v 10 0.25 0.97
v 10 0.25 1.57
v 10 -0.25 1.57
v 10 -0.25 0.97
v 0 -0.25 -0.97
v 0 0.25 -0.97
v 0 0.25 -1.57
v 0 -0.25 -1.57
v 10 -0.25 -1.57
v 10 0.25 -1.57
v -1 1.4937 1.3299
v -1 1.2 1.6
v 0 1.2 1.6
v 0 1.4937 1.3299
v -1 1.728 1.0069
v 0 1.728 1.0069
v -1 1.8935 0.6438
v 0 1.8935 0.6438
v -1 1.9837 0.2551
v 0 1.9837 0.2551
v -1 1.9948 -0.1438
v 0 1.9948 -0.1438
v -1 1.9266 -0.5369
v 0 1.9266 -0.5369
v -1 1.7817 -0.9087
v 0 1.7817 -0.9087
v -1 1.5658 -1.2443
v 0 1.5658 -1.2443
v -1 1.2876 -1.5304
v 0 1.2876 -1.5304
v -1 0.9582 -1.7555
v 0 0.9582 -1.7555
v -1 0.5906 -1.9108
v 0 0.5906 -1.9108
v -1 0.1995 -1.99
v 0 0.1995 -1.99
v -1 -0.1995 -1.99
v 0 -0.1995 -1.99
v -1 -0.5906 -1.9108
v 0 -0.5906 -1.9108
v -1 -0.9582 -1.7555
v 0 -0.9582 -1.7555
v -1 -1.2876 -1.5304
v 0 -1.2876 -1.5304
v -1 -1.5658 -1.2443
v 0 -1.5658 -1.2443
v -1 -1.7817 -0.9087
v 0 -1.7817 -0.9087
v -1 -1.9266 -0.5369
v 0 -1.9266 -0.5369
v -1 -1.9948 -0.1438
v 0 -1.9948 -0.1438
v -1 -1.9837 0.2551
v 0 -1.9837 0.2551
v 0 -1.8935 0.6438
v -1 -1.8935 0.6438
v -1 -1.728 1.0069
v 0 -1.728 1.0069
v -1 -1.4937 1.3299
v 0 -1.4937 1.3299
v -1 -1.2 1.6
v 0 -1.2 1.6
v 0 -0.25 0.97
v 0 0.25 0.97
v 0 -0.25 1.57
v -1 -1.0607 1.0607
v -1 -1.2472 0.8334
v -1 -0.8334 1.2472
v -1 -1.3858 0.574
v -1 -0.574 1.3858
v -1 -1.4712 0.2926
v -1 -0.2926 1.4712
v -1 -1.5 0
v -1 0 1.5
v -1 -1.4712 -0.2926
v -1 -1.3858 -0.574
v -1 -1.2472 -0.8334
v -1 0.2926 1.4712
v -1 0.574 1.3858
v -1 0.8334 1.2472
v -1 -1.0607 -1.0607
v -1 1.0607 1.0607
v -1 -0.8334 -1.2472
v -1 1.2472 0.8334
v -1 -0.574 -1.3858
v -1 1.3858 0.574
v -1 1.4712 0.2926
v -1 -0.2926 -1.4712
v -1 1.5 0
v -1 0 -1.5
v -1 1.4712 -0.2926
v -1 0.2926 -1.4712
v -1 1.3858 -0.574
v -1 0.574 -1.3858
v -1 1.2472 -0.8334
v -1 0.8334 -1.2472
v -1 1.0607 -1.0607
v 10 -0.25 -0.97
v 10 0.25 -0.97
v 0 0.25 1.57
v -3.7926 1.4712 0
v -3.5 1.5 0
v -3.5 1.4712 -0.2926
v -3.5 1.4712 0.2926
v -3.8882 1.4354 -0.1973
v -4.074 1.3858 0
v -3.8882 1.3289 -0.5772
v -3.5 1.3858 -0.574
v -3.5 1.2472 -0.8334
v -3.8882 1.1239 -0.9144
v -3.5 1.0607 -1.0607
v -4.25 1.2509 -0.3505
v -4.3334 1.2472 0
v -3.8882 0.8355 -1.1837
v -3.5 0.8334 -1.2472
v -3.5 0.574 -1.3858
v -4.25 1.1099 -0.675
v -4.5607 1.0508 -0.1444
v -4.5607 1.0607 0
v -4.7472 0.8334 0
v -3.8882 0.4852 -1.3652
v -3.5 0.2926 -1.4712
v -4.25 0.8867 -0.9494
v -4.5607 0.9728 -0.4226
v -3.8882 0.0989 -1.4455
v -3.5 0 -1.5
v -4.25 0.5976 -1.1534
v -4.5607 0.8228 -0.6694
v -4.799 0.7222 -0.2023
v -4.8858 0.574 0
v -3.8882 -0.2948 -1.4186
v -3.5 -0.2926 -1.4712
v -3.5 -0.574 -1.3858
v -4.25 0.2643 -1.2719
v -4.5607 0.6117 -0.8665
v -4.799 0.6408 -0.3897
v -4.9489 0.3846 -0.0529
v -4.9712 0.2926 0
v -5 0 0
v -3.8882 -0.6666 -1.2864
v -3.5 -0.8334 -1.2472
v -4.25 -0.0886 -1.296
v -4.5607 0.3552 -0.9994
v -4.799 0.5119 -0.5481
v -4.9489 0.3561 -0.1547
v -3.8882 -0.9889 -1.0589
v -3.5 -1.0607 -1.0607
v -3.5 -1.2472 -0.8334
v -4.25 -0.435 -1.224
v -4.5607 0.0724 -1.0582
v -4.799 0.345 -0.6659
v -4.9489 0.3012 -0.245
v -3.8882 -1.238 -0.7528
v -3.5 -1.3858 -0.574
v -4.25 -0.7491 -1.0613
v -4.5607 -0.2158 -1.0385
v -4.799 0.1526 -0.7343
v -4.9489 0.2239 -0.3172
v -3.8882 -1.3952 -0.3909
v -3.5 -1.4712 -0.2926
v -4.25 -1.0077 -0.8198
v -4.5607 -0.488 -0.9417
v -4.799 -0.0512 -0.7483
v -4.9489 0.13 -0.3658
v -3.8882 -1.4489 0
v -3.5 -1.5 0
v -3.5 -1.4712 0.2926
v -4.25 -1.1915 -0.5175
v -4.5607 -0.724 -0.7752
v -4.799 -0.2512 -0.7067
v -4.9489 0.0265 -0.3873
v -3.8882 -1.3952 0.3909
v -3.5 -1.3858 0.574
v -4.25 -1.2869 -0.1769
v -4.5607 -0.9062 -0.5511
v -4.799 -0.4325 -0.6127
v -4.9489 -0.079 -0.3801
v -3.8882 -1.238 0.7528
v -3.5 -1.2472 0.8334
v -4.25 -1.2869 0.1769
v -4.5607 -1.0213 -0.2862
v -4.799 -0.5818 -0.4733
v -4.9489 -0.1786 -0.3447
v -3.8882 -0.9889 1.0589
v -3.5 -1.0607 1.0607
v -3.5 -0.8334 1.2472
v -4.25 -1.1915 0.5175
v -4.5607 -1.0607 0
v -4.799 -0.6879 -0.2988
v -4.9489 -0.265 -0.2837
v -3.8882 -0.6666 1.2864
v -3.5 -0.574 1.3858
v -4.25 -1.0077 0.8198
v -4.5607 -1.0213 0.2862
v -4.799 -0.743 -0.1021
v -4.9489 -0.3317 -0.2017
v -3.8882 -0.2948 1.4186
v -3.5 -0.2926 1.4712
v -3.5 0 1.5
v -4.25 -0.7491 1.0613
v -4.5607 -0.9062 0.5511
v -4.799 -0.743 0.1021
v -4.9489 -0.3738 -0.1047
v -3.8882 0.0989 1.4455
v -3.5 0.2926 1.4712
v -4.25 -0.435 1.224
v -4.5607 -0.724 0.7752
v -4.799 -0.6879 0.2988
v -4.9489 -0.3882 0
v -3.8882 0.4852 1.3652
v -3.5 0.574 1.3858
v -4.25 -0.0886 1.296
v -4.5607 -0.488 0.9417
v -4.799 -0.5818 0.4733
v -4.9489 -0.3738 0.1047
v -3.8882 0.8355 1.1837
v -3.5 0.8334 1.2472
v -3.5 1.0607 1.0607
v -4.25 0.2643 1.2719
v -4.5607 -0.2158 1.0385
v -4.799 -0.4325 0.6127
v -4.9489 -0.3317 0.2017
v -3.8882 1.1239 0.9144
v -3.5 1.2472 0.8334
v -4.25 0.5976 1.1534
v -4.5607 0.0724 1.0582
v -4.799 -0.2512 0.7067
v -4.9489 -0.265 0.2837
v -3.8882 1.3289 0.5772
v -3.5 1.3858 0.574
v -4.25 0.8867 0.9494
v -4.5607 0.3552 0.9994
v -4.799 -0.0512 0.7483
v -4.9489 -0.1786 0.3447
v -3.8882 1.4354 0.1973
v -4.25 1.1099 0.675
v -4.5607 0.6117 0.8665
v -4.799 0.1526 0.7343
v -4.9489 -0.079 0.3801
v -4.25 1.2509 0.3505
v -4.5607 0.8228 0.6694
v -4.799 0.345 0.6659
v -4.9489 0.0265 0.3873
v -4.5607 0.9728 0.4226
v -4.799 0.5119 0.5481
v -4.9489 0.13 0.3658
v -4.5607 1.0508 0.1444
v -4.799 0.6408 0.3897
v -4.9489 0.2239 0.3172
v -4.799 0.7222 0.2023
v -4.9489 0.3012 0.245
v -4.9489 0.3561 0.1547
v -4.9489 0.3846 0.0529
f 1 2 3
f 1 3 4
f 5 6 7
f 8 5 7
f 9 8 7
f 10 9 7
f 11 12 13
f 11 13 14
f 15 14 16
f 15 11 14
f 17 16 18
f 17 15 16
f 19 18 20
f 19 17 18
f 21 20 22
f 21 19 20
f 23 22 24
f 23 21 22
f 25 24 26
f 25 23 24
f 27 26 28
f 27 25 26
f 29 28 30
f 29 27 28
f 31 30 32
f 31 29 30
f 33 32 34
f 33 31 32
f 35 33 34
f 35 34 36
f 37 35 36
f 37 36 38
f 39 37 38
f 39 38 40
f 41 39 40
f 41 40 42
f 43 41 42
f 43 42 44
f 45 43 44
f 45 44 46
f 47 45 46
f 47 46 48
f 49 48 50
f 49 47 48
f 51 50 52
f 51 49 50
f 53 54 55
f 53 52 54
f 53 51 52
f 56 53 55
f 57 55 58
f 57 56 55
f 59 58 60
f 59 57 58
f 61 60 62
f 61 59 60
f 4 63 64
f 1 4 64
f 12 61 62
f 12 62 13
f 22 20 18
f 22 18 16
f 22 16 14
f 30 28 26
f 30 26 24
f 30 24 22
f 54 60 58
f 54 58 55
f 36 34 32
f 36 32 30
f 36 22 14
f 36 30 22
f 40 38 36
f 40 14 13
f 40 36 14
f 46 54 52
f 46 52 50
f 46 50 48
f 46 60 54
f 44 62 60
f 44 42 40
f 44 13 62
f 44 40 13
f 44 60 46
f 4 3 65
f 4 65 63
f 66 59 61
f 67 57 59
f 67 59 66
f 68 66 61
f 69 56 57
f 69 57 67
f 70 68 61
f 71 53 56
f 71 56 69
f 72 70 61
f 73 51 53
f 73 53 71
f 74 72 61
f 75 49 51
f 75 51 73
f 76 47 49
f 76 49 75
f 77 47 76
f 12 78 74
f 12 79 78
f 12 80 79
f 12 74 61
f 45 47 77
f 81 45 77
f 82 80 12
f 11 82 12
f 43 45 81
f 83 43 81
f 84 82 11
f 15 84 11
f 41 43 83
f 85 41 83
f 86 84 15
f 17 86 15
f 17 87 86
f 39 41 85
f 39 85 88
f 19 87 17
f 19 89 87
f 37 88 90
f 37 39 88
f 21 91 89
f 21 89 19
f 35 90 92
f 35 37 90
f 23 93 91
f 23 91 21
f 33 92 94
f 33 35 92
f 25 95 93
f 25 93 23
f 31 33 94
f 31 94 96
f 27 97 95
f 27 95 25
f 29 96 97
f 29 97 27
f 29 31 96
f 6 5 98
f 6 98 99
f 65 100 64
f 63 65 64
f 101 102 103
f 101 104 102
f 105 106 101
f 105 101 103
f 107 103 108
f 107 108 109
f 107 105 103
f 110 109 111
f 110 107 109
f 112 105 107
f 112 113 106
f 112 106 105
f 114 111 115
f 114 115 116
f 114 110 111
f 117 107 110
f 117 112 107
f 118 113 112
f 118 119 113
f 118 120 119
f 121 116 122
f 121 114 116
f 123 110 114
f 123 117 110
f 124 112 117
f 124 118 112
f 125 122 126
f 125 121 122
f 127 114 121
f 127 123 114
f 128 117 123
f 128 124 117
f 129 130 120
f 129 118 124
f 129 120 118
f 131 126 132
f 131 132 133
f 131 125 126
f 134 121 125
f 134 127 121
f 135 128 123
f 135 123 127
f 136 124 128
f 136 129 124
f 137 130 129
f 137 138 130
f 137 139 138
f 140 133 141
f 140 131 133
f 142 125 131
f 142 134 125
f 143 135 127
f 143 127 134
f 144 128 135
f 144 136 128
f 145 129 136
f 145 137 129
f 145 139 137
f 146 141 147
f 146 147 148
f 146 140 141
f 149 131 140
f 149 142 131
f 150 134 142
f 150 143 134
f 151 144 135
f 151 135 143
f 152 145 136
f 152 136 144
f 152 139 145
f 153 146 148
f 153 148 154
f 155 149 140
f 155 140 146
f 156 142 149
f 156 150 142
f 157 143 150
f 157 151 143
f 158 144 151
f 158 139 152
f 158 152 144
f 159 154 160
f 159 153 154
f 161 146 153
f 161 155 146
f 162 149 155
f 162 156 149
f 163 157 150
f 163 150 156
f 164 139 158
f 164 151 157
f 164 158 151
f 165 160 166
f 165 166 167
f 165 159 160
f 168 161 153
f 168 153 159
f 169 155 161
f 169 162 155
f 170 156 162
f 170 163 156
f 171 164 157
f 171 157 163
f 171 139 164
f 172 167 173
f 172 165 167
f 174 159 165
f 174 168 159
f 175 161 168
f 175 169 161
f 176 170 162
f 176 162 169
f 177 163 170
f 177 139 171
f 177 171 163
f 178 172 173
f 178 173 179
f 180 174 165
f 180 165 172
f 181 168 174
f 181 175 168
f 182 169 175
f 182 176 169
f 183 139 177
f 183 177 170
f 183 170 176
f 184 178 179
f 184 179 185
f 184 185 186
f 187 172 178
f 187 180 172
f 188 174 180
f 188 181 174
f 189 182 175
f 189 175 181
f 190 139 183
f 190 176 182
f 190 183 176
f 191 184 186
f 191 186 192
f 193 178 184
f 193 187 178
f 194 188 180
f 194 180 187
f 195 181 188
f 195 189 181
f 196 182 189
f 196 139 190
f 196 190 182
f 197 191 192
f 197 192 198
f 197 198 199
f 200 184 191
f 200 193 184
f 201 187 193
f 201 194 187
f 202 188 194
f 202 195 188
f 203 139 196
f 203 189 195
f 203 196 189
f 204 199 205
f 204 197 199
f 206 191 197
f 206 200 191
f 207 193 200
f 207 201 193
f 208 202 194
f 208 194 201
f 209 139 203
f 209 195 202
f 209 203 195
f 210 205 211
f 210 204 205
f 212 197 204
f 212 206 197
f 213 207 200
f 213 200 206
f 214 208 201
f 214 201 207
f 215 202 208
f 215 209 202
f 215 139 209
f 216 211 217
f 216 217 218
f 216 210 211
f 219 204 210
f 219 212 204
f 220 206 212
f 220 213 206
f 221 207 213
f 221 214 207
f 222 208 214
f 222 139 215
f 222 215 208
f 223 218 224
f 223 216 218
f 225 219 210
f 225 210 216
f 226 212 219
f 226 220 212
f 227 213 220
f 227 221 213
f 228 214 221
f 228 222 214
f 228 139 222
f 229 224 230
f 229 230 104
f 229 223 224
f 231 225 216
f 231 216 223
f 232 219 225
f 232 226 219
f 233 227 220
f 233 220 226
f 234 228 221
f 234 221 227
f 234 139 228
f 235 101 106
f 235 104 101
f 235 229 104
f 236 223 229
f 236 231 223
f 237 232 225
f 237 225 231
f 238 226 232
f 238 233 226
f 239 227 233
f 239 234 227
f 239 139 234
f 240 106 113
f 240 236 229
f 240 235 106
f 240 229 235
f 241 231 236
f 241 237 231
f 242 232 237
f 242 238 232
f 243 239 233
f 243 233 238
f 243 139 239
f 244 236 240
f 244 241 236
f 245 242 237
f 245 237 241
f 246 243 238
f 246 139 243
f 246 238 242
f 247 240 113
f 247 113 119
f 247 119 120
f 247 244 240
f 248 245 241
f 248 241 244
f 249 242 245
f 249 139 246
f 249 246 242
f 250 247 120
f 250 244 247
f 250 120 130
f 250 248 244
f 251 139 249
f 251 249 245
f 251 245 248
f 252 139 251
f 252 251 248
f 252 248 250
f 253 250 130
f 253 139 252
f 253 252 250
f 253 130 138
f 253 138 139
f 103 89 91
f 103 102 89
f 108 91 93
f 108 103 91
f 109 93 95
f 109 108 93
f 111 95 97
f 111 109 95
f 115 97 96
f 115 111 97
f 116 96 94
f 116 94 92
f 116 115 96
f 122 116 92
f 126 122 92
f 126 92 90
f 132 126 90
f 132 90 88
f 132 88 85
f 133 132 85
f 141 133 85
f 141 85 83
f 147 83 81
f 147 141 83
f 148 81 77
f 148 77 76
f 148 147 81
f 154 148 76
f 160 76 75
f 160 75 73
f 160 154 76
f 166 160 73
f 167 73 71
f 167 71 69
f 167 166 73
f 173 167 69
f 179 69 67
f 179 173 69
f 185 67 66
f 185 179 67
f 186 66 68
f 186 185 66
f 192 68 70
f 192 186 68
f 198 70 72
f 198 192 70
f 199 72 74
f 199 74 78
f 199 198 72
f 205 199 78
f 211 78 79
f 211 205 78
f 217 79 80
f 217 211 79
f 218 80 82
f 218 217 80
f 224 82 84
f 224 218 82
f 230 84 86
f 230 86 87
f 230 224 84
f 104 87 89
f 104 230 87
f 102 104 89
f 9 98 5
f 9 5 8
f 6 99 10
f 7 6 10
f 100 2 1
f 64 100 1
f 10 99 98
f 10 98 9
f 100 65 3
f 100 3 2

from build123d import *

# Parameters (mm, degrees)
SKETCH_2_W          = 0.6
SKETCH_2_H          = 0.5
EXTRUDE_1_DEPTH     = 10
EXTRUDE_1_2_DEPTH   = 10
SKETCH_3_W          = 0.8
SKETCH_3_H          = 2.4
CUT_EXTRUDE_1_DEPTH = 12


with BuildPart() as part:
    # Эскиз1 → Повернуть1 (revolve)
    with BuildSketch(Plane.XY):
        with BuildLine():
            Line((0, 0), (0, 2))
            Line((0, 2), (-1, 2))
            Line((-1, 2), (-1, 1.5))
            Line((-1, 1.5), (-3.5, 1.5))
            ThreePointArc((-3.5, 1.5), (-4.560660172, 1.060660172), (-5, 0))
            Line((-5, 0), (0, 0))
        make_face()
    revolve(axis=Axis((0, 0, 0), (-1, 0, 0)))

    # Эскиз3 → Вырез-Вытянуть1 (cut, through all)
    with BuildSketch(Plane.ZY.offset(1)):
        with Locations((2, 0)):
            Rectangle(SKETCH_3_W, SKETCH_3_H)
    extrude(amount=-CUT_EXTRUDE_1_DEPTH, mode=Mode.SUBTRACT)


with BuildPart() as body_2:
    # Эскиз2 → Бобышка-Вытянуть1 (new body)
    with BuildSketch(Plane(origin=(0, 0, 0), x_dir=(0, 0, -1), z_dir=(1, 0, 0))):
        with Locations((-1.27, 0)):
            Rectangle(SKETCH_2_W, SKETCH_2_H)
    extrude(amount=EXTRUDE_1_DEPTH)


with BuildPart() as body_3:
    # Эскиз2 → Extrude 1 2 (new body)
    with BuildSketch(Plane(origin=(0, 0, 0), x_dir=(0, 0, -1), z_dir=(1, 0, 0))):
        with Locations((1.27, 0)):
            Rectangle(SKETCH_2_W, SKETCH_2_H)
    extrude(amount=EXTRUDE_1_2_DEPTH)


solid = Compound([part.part, body_2.part, body_3.part])
